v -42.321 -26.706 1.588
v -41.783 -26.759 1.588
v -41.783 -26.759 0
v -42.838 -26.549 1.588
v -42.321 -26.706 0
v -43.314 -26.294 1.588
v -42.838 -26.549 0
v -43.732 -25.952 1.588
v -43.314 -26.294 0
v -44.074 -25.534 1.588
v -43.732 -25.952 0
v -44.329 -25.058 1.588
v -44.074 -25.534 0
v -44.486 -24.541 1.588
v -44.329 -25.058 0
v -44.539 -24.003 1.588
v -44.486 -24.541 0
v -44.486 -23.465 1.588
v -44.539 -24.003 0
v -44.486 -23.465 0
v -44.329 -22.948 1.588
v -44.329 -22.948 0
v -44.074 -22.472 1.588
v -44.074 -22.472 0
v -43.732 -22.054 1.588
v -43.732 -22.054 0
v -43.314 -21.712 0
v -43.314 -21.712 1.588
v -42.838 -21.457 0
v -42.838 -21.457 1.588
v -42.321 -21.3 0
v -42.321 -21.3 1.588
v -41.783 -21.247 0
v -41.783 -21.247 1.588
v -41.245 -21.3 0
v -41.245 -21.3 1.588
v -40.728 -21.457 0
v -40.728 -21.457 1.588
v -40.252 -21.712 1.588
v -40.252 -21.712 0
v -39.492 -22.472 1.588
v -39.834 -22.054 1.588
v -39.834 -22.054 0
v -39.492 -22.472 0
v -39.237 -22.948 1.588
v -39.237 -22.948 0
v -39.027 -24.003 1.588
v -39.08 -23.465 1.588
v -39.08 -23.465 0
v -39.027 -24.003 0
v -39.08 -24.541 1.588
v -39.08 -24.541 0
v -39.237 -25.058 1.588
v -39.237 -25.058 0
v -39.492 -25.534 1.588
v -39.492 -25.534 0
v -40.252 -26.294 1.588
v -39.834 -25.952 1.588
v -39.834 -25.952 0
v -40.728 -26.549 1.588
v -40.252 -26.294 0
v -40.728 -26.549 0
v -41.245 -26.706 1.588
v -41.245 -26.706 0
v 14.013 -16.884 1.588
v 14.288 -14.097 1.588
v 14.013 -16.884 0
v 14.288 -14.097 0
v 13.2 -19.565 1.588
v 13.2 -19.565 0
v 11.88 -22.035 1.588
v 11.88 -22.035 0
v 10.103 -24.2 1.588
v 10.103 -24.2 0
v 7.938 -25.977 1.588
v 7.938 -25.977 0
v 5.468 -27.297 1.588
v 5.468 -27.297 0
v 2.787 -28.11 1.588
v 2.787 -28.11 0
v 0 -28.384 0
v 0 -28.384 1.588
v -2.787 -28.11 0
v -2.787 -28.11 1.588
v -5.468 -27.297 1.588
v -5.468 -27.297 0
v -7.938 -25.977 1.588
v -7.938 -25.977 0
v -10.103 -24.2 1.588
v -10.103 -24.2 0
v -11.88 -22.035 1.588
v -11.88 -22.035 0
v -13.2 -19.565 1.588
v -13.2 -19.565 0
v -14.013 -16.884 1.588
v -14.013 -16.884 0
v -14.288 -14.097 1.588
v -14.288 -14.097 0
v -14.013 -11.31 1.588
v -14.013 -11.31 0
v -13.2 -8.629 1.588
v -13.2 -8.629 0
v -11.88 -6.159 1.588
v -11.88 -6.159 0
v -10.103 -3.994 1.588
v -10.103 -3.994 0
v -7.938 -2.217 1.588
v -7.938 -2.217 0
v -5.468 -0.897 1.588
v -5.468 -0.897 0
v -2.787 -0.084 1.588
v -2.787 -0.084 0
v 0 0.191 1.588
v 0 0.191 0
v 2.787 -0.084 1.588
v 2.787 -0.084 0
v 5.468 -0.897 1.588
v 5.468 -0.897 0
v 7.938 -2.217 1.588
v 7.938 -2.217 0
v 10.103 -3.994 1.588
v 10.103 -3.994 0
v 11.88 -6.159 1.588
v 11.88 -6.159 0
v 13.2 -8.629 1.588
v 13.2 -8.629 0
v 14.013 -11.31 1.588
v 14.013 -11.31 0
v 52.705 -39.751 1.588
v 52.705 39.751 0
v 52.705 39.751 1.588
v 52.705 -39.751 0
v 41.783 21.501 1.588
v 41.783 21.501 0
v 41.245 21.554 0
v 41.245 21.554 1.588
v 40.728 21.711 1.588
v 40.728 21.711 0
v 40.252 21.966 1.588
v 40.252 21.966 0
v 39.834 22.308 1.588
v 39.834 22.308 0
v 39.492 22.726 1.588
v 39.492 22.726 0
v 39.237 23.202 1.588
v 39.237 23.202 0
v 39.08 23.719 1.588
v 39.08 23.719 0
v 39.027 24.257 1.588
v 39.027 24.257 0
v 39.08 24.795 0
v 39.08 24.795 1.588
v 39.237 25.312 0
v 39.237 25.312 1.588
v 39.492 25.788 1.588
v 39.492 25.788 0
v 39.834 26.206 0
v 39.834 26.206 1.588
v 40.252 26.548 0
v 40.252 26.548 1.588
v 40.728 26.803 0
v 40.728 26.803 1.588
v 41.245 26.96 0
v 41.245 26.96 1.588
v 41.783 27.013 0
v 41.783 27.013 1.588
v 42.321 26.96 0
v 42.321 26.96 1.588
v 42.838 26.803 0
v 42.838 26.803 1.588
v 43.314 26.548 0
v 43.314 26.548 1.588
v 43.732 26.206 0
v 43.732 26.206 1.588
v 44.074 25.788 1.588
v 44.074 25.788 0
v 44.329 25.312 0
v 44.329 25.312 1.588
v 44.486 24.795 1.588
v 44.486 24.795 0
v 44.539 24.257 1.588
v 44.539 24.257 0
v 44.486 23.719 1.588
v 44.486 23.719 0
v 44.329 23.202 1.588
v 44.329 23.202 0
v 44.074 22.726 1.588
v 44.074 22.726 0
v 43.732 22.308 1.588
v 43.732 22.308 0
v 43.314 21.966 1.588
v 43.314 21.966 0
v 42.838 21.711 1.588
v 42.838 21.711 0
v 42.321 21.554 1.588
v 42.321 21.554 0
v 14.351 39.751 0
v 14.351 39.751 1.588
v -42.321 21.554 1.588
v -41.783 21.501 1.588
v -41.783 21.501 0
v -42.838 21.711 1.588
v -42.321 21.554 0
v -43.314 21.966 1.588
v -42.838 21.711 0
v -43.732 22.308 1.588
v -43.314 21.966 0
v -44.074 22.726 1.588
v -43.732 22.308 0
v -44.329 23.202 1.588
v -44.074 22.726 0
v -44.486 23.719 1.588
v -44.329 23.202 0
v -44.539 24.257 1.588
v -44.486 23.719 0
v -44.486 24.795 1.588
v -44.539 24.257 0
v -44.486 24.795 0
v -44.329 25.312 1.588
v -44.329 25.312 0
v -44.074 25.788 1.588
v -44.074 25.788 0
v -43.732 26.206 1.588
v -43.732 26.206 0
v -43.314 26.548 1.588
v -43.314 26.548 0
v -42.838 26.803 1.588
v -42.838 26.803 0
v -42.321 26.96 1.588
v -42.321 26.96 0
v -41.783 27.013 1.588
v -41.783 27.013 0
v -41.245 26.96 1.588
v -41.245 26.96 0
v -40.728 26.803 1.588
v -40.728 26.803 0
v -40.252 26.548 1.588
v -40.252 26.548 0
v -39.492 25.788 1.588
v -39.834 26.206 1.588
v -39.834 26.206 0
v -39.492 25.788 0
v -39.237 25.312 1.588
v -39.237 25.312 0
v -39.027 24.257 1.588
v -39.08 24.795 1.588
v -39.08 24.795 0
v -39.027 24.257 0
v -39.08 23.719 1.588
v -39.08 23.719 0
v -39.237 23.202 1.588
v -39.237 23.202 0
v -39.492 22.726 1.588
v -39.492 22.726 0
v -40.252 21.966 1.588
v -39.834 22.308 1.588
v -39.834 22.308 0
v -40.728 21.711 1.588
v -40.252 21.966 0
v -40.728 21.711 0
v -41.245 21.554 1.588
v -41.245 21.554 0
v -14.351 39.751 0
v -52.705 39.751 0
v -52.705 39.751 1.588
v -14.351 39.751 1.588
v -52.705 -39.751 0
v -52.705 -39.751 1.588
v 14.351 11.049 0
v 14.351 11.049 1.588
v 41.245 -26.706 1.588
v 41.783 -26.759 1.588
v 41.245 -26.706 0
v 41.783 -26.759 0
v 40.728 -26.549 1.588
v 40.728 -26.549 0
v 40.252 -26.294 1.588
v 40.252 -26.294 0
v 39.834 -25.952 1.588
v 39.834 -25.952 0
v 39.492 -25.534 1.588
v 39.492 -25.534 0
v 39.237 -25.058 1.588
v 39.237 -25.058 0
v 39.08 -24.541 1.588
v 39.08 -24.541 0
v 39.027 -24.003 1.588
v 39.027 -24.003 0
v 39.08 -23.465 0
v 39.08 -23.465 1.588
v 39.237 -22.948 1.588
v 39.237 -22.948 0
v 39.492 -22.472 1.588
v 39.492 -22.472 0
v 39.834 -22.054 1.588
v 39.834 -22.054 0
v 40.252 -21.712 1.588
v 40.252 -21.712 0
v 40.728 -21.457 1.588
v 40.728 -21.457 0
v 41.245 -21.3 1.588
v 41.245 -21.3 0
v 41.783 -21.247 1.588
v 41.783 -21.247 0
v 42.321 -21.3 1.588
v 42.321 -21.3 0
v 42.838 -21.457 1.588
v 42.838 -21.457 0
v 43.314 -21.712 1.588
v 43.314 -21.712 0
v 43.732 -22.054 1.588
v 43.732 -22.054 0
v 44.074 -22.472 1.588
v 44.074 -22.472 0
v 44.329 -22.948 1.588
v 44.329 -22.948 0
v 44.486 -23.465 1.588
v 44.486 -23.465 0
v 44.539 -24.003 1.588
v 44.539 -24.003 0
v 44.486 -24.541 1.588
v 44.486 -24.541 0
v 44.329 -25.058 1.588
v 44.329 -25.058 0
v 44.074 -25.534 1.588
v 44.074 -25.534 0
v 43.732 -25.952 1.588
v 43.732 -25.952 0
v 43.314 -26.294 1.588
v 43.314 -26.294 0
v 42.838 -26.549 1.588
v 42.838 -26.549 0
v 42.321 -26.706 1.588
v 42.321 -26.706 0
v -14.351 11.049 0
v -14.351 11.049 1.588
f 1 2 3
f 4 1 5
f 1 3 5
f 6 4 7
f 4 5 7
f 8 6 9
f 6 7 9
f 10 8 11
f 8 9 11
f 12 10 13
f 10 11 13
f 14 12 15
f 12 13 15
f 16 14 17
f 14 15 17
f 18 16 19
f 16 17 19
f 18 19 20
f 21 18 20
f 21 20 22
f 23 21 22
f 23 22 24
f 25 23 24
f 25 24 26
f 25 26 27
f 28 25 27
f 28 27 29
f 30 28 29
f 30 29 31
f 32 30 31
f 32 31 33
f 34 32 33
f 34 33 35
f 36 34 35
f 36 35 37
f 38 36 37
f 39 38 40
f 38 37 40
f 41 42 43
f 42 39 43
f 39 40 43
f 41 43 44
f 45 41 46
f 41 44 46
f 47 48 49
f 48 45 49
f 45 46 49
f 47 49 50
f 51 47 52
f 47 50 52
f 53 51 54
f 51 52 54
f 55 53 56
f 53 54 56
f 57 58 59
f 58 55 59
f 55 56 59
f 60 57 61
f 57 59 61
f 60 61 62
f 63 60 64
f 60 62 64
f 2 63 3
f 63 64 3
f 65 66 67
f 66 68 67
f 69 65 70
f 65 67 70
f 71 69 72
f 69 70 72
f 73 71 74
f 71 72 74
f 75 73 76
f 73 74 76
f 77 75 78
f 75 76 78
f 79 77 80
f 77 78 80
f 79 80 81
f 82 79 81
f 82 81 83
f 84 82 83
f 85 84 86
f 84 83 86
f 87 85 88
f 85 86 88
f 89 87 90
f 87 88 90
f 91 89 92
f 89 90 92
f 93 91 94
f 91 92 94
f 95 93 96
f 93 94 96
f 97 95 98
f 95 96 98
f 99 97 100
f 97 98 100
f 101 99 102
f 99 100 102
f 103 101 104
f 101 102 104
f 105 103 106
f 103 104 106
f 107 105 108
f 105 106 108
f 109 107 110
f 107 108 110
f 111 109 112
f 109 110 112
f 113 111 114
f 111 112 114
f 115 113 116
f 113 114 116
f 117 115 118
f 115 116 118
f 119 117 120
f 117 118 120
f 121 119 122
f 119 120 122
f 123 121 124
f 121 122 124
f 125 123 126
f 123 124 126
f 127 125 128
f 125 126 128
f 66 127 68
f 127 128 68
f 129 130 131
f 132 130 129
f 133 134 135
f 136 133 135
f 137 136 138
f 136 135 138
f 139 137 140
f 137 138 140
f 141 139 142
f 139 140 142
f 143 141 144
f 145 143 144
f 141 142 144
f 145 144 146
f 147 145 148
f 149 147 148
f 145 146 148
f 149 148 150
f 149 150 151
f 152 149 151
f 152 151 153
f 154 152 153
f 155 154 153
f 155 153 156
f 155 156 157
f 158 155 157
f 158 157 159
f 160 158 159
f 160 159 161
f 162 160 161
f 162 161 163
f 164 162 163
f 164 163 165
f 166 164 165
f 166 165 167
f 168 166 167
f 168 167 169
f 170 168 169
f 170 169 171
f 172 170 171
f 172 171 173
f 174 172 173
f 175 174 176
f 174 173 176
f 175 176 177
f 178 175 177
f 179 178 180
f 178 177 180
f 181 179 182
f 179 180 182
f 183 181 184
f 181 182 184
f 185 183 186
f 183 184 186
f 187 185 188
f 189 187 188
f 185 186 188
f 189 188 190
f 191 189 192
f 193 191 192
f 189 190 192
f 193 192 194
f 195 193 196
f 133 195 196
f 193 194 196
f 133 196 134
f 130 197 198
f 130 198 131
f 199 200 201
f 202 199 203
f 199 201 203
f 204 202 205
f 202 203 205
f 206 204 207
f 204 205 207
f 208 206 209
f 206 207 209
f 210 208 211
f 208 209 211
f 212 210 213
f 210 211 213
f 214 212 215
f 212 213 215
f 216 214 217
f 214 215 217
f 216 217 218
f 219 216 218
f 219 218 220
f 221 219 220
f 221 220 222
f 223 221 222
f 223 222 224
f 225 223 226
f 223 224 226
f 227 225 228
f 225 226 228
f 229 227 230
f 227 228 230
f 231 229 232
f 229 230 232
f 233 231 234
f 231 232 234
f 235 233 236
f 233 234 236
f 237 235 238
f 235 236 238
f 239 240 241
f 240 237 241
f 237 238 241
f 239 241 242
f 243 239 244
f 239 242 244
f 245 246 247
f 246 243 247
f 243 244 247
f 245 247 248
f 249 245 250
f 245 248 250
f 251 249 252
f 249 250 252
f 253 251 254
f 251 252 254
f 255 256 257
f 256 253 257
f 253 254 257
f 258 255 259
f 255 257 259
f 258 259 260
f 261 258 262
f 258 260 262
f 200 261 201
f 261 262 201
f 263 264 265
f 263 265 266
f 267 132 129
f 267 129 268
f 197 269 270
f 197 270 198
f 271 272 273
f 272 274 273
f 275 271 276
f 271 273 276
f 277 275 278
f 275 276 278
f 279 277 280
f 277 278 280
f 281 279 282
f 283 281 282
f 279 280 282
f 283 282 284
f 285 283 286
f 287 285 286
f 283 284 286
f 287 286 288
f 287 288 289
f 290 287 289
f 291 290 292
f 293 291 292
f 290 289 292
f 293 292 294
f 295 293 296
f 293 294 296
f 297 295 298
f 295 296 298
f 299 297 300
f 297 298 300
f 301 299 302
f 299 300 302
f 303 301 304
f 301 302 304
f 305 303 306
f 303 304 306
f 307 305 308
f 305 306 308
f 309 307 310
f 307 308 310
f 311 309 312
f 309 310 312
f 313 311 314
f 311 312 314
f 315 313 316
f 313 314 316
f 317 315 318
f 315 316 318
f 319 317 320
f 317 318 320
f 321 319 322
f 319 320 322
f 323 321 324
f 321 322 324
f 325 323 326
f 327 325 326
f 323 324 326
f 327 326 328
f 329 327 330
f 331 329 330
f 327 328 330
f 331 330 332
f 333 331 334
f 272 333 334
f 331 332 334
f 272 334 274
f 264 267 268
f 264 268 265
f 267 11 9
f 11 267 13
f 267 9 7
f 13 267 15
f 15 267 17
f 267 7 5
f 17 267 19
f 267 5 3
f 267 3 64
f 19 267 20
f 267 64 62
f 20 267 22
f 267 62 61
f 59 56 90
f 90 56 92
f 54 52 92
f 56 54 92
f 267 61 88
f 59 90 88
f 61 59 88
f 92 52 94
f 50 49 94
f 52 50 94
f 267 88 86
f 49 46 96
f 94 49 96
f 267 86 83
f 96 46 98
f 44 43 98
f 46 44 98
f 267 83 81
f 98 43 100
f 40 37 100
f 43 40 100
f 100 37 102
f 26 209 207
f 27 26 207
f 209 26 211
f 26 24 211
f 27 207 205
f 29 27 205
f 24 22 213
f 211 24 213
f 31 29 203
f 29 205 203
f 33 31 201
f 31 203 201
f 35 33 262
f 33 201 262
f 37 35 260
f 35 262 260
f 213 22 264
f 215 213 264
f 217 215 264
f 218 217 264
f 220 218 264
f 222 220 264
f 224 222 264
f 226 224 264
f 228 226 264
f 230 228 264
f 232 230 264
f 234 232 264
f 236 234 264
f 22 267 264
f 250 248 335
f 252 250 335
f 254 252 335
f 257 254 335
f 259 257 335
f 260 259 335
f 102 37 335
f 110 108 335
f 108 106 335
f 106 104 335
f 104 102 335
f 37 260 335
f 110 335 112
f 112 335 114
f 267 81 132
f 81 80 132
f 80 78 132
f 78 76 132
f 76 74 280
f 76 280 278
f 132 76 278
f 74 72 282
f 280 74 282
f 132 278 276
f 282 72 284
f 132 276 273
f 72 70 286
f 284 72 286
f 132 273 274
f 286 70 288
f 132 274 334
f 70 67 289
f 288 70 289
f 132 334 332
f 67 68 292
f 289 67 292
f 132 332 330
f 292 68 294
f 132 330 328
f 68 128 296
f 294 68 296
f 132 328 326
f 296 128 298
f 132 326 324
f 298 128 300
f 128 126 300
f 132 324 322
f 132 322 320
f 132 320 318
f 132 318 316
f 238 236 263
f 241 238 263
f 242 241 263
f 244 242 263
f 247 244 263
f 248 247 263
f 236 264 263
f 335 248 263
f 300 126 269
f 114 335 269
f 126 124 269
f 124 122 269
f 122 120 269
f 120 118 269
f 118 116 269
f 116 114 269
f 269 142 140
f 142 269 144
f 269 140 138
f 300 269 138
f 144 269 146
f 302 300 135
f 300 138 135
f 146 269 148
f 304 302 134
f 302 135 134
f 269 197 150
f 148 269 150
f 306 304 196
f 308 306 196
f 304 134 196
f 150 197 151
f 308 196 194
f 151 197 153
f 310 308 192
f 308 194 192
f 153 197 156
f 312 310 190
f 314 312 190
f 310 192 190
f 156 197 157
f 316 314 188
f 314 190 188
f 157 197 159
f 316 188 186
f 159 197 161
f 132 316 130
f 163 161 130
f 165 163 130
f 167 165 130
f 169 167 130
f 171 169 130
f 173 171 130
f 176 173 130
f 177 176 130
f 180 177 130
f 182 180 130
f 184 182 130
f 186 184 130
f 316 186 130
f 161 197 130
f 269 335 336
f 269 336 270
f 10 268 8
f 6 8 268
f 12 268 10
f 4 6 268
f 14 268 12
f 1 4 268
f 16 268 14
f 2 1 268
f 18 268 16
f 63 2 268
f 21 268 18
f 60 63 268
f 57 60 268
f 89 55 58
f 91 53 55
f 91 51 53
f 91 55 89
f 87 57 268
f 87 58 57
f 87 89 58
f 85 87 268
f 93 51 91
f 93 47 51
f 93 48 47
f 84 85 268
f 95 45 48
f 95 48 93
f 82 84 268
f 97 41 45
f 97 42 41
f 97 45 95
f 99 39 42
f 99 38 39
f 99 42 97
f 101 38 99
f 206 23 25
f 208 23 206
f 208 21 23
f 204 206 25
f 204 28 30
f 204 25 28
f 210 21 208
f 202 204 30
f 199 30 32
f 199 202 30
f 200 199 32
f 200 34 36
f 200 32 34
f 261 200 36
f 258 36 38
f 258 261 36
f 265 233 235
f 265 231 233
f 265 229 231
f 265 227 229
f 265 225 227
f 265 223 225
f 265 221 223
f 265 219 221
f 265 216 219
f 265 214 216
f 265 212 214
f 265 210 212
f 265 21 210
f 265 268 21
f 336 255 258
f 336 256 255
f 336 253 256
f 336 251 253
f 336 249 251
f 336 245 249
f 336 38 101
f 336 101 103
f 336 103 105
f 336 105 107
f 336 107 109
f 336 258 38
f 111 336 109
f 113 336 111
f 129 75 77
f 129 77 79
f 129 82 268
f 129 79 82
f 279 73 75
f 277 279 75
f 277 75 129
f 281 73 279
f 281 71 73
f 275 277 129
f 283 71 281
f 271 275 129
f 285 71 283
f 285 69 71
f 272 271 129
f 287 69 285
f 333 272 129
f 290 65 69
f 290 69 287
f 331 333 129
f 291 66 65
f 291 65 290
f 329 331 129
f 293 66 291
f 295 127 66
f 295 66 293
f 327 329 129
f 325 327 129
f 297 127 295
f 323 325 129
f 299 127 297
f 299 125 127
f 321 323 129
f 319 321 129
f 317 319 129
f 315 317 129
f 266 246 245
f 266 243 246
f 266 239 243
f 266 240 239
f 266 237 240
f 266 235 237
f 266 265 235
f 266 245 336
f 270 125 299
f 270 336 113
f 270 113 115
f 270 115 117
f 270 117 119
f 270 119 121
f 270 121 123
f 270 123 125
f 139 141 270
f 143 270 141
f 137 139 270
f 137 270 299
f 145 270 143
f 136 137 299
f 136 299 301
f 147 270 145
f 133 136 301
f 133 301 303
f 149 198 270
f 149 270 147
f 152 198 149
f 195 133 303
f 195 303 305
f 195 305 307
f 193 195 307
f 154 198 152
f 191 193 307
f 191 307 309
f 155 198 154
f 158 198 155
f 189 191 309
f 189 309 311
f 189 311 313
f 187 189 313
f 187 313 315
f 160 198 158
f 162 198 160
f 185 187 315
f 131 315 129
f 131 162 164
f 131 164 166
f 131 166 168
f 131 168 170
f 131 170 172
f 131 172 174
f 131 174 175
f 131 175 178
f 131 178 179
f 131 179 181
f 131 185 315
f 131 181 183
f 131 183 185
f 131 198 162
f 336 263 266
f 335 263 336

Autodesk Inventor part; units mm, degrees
ref_plane "YZ Plane" through (0, 0, 0) normal (1, 0, 0) x (0, 1, 0)
ref_plane "XZ Plane" through (0, 0, 0) normal (0, 1, 0) x (-1, 0, 0)
ref_plane "XY Plane" through (0, 0, 0) normal (0, 0, 1) x (1, 0, 0)
sketch "Sketch1" plane through (0, 0, 0) normal (0, 0, 1) x (1, 0, 0)
  line L0 (0, -55.6514) -> (0, 55.6514) projected
  line L1 (52.705, 39.751) -> (52.705, -39.751)
  line L2 (52.705, -39.751) -> (-52.705, -39.751)
  line L3 (-52.705, -39.751) -> (-52.705, 39.751)
  line L4 (-73.787, 0) -> (73.787, 0) projected
  line L5 (-14.351, 39.751) -> (-14.351, 11.049)
  line L6 (-14.351, 11.049) -> (14.351, 11.049)
  line L7 (14.351, 11.049) -> (14.351, 39.751)
  line L8 (-52.705, 39.751) -> (-14.351, 39.751)
  line L9 (14.351, 39.751) -> (52.705, 39.751)
  line L10 (0, -39.751) -> (0, -14.097)
  circle A0 centre (0, -14.097) radius 14.2875
  point P0 (0, 0)
  dimension "d0" = 105.41
  dimension "d1" = 79.502
  dimension "d2" = 28.702
  dimension "d3" = 28.702
  dimension "d4" = 25.654
  dimension "d5" = 28.575
extrude "Extrusion1" add sketch "Sketch1" along normal blind 1.5875 contours L2 L3 L4 A0 L0 | L0 A0 L4 L1 L2 | L4 L3 L8 L5 L6 L0 A0 | L4 A0 L0 L6 L7 L9 L1
sketch "Sketch2" plane through (0, 0, 1.5875) normal (0, 0, 1) x (1, 0, 0)
  line L0 (52.705, -39.751) -> (52.705, 39.751) projected
  line L1 (-52.705, -39.751) -> (52.705, -39.751) projected
  point P0 (0, 0)
  point P1 (41.783, 24.257)
  point P2 (41.783, -24.003)
  dimension "d15" = 48.26
  dimension "d16" = 10.922
  dimension "d17" = 10.922
  dimension "d18" = 15.748
hole "Hole1" at (41.783, 24.257, 1.5875) at (41.783, -24.003, 1.5875) direction (0, 0, -1) diameter 5.5118 end through all clearance for "Flat Head Machine Screw" size "M5" standard "Ansi Metric M Profile"
mirror "Mirror1" about plane through (0, 0, 0) normal (1, 0, 0) of "Hole1"
properties part number "DIFF_ROD"
